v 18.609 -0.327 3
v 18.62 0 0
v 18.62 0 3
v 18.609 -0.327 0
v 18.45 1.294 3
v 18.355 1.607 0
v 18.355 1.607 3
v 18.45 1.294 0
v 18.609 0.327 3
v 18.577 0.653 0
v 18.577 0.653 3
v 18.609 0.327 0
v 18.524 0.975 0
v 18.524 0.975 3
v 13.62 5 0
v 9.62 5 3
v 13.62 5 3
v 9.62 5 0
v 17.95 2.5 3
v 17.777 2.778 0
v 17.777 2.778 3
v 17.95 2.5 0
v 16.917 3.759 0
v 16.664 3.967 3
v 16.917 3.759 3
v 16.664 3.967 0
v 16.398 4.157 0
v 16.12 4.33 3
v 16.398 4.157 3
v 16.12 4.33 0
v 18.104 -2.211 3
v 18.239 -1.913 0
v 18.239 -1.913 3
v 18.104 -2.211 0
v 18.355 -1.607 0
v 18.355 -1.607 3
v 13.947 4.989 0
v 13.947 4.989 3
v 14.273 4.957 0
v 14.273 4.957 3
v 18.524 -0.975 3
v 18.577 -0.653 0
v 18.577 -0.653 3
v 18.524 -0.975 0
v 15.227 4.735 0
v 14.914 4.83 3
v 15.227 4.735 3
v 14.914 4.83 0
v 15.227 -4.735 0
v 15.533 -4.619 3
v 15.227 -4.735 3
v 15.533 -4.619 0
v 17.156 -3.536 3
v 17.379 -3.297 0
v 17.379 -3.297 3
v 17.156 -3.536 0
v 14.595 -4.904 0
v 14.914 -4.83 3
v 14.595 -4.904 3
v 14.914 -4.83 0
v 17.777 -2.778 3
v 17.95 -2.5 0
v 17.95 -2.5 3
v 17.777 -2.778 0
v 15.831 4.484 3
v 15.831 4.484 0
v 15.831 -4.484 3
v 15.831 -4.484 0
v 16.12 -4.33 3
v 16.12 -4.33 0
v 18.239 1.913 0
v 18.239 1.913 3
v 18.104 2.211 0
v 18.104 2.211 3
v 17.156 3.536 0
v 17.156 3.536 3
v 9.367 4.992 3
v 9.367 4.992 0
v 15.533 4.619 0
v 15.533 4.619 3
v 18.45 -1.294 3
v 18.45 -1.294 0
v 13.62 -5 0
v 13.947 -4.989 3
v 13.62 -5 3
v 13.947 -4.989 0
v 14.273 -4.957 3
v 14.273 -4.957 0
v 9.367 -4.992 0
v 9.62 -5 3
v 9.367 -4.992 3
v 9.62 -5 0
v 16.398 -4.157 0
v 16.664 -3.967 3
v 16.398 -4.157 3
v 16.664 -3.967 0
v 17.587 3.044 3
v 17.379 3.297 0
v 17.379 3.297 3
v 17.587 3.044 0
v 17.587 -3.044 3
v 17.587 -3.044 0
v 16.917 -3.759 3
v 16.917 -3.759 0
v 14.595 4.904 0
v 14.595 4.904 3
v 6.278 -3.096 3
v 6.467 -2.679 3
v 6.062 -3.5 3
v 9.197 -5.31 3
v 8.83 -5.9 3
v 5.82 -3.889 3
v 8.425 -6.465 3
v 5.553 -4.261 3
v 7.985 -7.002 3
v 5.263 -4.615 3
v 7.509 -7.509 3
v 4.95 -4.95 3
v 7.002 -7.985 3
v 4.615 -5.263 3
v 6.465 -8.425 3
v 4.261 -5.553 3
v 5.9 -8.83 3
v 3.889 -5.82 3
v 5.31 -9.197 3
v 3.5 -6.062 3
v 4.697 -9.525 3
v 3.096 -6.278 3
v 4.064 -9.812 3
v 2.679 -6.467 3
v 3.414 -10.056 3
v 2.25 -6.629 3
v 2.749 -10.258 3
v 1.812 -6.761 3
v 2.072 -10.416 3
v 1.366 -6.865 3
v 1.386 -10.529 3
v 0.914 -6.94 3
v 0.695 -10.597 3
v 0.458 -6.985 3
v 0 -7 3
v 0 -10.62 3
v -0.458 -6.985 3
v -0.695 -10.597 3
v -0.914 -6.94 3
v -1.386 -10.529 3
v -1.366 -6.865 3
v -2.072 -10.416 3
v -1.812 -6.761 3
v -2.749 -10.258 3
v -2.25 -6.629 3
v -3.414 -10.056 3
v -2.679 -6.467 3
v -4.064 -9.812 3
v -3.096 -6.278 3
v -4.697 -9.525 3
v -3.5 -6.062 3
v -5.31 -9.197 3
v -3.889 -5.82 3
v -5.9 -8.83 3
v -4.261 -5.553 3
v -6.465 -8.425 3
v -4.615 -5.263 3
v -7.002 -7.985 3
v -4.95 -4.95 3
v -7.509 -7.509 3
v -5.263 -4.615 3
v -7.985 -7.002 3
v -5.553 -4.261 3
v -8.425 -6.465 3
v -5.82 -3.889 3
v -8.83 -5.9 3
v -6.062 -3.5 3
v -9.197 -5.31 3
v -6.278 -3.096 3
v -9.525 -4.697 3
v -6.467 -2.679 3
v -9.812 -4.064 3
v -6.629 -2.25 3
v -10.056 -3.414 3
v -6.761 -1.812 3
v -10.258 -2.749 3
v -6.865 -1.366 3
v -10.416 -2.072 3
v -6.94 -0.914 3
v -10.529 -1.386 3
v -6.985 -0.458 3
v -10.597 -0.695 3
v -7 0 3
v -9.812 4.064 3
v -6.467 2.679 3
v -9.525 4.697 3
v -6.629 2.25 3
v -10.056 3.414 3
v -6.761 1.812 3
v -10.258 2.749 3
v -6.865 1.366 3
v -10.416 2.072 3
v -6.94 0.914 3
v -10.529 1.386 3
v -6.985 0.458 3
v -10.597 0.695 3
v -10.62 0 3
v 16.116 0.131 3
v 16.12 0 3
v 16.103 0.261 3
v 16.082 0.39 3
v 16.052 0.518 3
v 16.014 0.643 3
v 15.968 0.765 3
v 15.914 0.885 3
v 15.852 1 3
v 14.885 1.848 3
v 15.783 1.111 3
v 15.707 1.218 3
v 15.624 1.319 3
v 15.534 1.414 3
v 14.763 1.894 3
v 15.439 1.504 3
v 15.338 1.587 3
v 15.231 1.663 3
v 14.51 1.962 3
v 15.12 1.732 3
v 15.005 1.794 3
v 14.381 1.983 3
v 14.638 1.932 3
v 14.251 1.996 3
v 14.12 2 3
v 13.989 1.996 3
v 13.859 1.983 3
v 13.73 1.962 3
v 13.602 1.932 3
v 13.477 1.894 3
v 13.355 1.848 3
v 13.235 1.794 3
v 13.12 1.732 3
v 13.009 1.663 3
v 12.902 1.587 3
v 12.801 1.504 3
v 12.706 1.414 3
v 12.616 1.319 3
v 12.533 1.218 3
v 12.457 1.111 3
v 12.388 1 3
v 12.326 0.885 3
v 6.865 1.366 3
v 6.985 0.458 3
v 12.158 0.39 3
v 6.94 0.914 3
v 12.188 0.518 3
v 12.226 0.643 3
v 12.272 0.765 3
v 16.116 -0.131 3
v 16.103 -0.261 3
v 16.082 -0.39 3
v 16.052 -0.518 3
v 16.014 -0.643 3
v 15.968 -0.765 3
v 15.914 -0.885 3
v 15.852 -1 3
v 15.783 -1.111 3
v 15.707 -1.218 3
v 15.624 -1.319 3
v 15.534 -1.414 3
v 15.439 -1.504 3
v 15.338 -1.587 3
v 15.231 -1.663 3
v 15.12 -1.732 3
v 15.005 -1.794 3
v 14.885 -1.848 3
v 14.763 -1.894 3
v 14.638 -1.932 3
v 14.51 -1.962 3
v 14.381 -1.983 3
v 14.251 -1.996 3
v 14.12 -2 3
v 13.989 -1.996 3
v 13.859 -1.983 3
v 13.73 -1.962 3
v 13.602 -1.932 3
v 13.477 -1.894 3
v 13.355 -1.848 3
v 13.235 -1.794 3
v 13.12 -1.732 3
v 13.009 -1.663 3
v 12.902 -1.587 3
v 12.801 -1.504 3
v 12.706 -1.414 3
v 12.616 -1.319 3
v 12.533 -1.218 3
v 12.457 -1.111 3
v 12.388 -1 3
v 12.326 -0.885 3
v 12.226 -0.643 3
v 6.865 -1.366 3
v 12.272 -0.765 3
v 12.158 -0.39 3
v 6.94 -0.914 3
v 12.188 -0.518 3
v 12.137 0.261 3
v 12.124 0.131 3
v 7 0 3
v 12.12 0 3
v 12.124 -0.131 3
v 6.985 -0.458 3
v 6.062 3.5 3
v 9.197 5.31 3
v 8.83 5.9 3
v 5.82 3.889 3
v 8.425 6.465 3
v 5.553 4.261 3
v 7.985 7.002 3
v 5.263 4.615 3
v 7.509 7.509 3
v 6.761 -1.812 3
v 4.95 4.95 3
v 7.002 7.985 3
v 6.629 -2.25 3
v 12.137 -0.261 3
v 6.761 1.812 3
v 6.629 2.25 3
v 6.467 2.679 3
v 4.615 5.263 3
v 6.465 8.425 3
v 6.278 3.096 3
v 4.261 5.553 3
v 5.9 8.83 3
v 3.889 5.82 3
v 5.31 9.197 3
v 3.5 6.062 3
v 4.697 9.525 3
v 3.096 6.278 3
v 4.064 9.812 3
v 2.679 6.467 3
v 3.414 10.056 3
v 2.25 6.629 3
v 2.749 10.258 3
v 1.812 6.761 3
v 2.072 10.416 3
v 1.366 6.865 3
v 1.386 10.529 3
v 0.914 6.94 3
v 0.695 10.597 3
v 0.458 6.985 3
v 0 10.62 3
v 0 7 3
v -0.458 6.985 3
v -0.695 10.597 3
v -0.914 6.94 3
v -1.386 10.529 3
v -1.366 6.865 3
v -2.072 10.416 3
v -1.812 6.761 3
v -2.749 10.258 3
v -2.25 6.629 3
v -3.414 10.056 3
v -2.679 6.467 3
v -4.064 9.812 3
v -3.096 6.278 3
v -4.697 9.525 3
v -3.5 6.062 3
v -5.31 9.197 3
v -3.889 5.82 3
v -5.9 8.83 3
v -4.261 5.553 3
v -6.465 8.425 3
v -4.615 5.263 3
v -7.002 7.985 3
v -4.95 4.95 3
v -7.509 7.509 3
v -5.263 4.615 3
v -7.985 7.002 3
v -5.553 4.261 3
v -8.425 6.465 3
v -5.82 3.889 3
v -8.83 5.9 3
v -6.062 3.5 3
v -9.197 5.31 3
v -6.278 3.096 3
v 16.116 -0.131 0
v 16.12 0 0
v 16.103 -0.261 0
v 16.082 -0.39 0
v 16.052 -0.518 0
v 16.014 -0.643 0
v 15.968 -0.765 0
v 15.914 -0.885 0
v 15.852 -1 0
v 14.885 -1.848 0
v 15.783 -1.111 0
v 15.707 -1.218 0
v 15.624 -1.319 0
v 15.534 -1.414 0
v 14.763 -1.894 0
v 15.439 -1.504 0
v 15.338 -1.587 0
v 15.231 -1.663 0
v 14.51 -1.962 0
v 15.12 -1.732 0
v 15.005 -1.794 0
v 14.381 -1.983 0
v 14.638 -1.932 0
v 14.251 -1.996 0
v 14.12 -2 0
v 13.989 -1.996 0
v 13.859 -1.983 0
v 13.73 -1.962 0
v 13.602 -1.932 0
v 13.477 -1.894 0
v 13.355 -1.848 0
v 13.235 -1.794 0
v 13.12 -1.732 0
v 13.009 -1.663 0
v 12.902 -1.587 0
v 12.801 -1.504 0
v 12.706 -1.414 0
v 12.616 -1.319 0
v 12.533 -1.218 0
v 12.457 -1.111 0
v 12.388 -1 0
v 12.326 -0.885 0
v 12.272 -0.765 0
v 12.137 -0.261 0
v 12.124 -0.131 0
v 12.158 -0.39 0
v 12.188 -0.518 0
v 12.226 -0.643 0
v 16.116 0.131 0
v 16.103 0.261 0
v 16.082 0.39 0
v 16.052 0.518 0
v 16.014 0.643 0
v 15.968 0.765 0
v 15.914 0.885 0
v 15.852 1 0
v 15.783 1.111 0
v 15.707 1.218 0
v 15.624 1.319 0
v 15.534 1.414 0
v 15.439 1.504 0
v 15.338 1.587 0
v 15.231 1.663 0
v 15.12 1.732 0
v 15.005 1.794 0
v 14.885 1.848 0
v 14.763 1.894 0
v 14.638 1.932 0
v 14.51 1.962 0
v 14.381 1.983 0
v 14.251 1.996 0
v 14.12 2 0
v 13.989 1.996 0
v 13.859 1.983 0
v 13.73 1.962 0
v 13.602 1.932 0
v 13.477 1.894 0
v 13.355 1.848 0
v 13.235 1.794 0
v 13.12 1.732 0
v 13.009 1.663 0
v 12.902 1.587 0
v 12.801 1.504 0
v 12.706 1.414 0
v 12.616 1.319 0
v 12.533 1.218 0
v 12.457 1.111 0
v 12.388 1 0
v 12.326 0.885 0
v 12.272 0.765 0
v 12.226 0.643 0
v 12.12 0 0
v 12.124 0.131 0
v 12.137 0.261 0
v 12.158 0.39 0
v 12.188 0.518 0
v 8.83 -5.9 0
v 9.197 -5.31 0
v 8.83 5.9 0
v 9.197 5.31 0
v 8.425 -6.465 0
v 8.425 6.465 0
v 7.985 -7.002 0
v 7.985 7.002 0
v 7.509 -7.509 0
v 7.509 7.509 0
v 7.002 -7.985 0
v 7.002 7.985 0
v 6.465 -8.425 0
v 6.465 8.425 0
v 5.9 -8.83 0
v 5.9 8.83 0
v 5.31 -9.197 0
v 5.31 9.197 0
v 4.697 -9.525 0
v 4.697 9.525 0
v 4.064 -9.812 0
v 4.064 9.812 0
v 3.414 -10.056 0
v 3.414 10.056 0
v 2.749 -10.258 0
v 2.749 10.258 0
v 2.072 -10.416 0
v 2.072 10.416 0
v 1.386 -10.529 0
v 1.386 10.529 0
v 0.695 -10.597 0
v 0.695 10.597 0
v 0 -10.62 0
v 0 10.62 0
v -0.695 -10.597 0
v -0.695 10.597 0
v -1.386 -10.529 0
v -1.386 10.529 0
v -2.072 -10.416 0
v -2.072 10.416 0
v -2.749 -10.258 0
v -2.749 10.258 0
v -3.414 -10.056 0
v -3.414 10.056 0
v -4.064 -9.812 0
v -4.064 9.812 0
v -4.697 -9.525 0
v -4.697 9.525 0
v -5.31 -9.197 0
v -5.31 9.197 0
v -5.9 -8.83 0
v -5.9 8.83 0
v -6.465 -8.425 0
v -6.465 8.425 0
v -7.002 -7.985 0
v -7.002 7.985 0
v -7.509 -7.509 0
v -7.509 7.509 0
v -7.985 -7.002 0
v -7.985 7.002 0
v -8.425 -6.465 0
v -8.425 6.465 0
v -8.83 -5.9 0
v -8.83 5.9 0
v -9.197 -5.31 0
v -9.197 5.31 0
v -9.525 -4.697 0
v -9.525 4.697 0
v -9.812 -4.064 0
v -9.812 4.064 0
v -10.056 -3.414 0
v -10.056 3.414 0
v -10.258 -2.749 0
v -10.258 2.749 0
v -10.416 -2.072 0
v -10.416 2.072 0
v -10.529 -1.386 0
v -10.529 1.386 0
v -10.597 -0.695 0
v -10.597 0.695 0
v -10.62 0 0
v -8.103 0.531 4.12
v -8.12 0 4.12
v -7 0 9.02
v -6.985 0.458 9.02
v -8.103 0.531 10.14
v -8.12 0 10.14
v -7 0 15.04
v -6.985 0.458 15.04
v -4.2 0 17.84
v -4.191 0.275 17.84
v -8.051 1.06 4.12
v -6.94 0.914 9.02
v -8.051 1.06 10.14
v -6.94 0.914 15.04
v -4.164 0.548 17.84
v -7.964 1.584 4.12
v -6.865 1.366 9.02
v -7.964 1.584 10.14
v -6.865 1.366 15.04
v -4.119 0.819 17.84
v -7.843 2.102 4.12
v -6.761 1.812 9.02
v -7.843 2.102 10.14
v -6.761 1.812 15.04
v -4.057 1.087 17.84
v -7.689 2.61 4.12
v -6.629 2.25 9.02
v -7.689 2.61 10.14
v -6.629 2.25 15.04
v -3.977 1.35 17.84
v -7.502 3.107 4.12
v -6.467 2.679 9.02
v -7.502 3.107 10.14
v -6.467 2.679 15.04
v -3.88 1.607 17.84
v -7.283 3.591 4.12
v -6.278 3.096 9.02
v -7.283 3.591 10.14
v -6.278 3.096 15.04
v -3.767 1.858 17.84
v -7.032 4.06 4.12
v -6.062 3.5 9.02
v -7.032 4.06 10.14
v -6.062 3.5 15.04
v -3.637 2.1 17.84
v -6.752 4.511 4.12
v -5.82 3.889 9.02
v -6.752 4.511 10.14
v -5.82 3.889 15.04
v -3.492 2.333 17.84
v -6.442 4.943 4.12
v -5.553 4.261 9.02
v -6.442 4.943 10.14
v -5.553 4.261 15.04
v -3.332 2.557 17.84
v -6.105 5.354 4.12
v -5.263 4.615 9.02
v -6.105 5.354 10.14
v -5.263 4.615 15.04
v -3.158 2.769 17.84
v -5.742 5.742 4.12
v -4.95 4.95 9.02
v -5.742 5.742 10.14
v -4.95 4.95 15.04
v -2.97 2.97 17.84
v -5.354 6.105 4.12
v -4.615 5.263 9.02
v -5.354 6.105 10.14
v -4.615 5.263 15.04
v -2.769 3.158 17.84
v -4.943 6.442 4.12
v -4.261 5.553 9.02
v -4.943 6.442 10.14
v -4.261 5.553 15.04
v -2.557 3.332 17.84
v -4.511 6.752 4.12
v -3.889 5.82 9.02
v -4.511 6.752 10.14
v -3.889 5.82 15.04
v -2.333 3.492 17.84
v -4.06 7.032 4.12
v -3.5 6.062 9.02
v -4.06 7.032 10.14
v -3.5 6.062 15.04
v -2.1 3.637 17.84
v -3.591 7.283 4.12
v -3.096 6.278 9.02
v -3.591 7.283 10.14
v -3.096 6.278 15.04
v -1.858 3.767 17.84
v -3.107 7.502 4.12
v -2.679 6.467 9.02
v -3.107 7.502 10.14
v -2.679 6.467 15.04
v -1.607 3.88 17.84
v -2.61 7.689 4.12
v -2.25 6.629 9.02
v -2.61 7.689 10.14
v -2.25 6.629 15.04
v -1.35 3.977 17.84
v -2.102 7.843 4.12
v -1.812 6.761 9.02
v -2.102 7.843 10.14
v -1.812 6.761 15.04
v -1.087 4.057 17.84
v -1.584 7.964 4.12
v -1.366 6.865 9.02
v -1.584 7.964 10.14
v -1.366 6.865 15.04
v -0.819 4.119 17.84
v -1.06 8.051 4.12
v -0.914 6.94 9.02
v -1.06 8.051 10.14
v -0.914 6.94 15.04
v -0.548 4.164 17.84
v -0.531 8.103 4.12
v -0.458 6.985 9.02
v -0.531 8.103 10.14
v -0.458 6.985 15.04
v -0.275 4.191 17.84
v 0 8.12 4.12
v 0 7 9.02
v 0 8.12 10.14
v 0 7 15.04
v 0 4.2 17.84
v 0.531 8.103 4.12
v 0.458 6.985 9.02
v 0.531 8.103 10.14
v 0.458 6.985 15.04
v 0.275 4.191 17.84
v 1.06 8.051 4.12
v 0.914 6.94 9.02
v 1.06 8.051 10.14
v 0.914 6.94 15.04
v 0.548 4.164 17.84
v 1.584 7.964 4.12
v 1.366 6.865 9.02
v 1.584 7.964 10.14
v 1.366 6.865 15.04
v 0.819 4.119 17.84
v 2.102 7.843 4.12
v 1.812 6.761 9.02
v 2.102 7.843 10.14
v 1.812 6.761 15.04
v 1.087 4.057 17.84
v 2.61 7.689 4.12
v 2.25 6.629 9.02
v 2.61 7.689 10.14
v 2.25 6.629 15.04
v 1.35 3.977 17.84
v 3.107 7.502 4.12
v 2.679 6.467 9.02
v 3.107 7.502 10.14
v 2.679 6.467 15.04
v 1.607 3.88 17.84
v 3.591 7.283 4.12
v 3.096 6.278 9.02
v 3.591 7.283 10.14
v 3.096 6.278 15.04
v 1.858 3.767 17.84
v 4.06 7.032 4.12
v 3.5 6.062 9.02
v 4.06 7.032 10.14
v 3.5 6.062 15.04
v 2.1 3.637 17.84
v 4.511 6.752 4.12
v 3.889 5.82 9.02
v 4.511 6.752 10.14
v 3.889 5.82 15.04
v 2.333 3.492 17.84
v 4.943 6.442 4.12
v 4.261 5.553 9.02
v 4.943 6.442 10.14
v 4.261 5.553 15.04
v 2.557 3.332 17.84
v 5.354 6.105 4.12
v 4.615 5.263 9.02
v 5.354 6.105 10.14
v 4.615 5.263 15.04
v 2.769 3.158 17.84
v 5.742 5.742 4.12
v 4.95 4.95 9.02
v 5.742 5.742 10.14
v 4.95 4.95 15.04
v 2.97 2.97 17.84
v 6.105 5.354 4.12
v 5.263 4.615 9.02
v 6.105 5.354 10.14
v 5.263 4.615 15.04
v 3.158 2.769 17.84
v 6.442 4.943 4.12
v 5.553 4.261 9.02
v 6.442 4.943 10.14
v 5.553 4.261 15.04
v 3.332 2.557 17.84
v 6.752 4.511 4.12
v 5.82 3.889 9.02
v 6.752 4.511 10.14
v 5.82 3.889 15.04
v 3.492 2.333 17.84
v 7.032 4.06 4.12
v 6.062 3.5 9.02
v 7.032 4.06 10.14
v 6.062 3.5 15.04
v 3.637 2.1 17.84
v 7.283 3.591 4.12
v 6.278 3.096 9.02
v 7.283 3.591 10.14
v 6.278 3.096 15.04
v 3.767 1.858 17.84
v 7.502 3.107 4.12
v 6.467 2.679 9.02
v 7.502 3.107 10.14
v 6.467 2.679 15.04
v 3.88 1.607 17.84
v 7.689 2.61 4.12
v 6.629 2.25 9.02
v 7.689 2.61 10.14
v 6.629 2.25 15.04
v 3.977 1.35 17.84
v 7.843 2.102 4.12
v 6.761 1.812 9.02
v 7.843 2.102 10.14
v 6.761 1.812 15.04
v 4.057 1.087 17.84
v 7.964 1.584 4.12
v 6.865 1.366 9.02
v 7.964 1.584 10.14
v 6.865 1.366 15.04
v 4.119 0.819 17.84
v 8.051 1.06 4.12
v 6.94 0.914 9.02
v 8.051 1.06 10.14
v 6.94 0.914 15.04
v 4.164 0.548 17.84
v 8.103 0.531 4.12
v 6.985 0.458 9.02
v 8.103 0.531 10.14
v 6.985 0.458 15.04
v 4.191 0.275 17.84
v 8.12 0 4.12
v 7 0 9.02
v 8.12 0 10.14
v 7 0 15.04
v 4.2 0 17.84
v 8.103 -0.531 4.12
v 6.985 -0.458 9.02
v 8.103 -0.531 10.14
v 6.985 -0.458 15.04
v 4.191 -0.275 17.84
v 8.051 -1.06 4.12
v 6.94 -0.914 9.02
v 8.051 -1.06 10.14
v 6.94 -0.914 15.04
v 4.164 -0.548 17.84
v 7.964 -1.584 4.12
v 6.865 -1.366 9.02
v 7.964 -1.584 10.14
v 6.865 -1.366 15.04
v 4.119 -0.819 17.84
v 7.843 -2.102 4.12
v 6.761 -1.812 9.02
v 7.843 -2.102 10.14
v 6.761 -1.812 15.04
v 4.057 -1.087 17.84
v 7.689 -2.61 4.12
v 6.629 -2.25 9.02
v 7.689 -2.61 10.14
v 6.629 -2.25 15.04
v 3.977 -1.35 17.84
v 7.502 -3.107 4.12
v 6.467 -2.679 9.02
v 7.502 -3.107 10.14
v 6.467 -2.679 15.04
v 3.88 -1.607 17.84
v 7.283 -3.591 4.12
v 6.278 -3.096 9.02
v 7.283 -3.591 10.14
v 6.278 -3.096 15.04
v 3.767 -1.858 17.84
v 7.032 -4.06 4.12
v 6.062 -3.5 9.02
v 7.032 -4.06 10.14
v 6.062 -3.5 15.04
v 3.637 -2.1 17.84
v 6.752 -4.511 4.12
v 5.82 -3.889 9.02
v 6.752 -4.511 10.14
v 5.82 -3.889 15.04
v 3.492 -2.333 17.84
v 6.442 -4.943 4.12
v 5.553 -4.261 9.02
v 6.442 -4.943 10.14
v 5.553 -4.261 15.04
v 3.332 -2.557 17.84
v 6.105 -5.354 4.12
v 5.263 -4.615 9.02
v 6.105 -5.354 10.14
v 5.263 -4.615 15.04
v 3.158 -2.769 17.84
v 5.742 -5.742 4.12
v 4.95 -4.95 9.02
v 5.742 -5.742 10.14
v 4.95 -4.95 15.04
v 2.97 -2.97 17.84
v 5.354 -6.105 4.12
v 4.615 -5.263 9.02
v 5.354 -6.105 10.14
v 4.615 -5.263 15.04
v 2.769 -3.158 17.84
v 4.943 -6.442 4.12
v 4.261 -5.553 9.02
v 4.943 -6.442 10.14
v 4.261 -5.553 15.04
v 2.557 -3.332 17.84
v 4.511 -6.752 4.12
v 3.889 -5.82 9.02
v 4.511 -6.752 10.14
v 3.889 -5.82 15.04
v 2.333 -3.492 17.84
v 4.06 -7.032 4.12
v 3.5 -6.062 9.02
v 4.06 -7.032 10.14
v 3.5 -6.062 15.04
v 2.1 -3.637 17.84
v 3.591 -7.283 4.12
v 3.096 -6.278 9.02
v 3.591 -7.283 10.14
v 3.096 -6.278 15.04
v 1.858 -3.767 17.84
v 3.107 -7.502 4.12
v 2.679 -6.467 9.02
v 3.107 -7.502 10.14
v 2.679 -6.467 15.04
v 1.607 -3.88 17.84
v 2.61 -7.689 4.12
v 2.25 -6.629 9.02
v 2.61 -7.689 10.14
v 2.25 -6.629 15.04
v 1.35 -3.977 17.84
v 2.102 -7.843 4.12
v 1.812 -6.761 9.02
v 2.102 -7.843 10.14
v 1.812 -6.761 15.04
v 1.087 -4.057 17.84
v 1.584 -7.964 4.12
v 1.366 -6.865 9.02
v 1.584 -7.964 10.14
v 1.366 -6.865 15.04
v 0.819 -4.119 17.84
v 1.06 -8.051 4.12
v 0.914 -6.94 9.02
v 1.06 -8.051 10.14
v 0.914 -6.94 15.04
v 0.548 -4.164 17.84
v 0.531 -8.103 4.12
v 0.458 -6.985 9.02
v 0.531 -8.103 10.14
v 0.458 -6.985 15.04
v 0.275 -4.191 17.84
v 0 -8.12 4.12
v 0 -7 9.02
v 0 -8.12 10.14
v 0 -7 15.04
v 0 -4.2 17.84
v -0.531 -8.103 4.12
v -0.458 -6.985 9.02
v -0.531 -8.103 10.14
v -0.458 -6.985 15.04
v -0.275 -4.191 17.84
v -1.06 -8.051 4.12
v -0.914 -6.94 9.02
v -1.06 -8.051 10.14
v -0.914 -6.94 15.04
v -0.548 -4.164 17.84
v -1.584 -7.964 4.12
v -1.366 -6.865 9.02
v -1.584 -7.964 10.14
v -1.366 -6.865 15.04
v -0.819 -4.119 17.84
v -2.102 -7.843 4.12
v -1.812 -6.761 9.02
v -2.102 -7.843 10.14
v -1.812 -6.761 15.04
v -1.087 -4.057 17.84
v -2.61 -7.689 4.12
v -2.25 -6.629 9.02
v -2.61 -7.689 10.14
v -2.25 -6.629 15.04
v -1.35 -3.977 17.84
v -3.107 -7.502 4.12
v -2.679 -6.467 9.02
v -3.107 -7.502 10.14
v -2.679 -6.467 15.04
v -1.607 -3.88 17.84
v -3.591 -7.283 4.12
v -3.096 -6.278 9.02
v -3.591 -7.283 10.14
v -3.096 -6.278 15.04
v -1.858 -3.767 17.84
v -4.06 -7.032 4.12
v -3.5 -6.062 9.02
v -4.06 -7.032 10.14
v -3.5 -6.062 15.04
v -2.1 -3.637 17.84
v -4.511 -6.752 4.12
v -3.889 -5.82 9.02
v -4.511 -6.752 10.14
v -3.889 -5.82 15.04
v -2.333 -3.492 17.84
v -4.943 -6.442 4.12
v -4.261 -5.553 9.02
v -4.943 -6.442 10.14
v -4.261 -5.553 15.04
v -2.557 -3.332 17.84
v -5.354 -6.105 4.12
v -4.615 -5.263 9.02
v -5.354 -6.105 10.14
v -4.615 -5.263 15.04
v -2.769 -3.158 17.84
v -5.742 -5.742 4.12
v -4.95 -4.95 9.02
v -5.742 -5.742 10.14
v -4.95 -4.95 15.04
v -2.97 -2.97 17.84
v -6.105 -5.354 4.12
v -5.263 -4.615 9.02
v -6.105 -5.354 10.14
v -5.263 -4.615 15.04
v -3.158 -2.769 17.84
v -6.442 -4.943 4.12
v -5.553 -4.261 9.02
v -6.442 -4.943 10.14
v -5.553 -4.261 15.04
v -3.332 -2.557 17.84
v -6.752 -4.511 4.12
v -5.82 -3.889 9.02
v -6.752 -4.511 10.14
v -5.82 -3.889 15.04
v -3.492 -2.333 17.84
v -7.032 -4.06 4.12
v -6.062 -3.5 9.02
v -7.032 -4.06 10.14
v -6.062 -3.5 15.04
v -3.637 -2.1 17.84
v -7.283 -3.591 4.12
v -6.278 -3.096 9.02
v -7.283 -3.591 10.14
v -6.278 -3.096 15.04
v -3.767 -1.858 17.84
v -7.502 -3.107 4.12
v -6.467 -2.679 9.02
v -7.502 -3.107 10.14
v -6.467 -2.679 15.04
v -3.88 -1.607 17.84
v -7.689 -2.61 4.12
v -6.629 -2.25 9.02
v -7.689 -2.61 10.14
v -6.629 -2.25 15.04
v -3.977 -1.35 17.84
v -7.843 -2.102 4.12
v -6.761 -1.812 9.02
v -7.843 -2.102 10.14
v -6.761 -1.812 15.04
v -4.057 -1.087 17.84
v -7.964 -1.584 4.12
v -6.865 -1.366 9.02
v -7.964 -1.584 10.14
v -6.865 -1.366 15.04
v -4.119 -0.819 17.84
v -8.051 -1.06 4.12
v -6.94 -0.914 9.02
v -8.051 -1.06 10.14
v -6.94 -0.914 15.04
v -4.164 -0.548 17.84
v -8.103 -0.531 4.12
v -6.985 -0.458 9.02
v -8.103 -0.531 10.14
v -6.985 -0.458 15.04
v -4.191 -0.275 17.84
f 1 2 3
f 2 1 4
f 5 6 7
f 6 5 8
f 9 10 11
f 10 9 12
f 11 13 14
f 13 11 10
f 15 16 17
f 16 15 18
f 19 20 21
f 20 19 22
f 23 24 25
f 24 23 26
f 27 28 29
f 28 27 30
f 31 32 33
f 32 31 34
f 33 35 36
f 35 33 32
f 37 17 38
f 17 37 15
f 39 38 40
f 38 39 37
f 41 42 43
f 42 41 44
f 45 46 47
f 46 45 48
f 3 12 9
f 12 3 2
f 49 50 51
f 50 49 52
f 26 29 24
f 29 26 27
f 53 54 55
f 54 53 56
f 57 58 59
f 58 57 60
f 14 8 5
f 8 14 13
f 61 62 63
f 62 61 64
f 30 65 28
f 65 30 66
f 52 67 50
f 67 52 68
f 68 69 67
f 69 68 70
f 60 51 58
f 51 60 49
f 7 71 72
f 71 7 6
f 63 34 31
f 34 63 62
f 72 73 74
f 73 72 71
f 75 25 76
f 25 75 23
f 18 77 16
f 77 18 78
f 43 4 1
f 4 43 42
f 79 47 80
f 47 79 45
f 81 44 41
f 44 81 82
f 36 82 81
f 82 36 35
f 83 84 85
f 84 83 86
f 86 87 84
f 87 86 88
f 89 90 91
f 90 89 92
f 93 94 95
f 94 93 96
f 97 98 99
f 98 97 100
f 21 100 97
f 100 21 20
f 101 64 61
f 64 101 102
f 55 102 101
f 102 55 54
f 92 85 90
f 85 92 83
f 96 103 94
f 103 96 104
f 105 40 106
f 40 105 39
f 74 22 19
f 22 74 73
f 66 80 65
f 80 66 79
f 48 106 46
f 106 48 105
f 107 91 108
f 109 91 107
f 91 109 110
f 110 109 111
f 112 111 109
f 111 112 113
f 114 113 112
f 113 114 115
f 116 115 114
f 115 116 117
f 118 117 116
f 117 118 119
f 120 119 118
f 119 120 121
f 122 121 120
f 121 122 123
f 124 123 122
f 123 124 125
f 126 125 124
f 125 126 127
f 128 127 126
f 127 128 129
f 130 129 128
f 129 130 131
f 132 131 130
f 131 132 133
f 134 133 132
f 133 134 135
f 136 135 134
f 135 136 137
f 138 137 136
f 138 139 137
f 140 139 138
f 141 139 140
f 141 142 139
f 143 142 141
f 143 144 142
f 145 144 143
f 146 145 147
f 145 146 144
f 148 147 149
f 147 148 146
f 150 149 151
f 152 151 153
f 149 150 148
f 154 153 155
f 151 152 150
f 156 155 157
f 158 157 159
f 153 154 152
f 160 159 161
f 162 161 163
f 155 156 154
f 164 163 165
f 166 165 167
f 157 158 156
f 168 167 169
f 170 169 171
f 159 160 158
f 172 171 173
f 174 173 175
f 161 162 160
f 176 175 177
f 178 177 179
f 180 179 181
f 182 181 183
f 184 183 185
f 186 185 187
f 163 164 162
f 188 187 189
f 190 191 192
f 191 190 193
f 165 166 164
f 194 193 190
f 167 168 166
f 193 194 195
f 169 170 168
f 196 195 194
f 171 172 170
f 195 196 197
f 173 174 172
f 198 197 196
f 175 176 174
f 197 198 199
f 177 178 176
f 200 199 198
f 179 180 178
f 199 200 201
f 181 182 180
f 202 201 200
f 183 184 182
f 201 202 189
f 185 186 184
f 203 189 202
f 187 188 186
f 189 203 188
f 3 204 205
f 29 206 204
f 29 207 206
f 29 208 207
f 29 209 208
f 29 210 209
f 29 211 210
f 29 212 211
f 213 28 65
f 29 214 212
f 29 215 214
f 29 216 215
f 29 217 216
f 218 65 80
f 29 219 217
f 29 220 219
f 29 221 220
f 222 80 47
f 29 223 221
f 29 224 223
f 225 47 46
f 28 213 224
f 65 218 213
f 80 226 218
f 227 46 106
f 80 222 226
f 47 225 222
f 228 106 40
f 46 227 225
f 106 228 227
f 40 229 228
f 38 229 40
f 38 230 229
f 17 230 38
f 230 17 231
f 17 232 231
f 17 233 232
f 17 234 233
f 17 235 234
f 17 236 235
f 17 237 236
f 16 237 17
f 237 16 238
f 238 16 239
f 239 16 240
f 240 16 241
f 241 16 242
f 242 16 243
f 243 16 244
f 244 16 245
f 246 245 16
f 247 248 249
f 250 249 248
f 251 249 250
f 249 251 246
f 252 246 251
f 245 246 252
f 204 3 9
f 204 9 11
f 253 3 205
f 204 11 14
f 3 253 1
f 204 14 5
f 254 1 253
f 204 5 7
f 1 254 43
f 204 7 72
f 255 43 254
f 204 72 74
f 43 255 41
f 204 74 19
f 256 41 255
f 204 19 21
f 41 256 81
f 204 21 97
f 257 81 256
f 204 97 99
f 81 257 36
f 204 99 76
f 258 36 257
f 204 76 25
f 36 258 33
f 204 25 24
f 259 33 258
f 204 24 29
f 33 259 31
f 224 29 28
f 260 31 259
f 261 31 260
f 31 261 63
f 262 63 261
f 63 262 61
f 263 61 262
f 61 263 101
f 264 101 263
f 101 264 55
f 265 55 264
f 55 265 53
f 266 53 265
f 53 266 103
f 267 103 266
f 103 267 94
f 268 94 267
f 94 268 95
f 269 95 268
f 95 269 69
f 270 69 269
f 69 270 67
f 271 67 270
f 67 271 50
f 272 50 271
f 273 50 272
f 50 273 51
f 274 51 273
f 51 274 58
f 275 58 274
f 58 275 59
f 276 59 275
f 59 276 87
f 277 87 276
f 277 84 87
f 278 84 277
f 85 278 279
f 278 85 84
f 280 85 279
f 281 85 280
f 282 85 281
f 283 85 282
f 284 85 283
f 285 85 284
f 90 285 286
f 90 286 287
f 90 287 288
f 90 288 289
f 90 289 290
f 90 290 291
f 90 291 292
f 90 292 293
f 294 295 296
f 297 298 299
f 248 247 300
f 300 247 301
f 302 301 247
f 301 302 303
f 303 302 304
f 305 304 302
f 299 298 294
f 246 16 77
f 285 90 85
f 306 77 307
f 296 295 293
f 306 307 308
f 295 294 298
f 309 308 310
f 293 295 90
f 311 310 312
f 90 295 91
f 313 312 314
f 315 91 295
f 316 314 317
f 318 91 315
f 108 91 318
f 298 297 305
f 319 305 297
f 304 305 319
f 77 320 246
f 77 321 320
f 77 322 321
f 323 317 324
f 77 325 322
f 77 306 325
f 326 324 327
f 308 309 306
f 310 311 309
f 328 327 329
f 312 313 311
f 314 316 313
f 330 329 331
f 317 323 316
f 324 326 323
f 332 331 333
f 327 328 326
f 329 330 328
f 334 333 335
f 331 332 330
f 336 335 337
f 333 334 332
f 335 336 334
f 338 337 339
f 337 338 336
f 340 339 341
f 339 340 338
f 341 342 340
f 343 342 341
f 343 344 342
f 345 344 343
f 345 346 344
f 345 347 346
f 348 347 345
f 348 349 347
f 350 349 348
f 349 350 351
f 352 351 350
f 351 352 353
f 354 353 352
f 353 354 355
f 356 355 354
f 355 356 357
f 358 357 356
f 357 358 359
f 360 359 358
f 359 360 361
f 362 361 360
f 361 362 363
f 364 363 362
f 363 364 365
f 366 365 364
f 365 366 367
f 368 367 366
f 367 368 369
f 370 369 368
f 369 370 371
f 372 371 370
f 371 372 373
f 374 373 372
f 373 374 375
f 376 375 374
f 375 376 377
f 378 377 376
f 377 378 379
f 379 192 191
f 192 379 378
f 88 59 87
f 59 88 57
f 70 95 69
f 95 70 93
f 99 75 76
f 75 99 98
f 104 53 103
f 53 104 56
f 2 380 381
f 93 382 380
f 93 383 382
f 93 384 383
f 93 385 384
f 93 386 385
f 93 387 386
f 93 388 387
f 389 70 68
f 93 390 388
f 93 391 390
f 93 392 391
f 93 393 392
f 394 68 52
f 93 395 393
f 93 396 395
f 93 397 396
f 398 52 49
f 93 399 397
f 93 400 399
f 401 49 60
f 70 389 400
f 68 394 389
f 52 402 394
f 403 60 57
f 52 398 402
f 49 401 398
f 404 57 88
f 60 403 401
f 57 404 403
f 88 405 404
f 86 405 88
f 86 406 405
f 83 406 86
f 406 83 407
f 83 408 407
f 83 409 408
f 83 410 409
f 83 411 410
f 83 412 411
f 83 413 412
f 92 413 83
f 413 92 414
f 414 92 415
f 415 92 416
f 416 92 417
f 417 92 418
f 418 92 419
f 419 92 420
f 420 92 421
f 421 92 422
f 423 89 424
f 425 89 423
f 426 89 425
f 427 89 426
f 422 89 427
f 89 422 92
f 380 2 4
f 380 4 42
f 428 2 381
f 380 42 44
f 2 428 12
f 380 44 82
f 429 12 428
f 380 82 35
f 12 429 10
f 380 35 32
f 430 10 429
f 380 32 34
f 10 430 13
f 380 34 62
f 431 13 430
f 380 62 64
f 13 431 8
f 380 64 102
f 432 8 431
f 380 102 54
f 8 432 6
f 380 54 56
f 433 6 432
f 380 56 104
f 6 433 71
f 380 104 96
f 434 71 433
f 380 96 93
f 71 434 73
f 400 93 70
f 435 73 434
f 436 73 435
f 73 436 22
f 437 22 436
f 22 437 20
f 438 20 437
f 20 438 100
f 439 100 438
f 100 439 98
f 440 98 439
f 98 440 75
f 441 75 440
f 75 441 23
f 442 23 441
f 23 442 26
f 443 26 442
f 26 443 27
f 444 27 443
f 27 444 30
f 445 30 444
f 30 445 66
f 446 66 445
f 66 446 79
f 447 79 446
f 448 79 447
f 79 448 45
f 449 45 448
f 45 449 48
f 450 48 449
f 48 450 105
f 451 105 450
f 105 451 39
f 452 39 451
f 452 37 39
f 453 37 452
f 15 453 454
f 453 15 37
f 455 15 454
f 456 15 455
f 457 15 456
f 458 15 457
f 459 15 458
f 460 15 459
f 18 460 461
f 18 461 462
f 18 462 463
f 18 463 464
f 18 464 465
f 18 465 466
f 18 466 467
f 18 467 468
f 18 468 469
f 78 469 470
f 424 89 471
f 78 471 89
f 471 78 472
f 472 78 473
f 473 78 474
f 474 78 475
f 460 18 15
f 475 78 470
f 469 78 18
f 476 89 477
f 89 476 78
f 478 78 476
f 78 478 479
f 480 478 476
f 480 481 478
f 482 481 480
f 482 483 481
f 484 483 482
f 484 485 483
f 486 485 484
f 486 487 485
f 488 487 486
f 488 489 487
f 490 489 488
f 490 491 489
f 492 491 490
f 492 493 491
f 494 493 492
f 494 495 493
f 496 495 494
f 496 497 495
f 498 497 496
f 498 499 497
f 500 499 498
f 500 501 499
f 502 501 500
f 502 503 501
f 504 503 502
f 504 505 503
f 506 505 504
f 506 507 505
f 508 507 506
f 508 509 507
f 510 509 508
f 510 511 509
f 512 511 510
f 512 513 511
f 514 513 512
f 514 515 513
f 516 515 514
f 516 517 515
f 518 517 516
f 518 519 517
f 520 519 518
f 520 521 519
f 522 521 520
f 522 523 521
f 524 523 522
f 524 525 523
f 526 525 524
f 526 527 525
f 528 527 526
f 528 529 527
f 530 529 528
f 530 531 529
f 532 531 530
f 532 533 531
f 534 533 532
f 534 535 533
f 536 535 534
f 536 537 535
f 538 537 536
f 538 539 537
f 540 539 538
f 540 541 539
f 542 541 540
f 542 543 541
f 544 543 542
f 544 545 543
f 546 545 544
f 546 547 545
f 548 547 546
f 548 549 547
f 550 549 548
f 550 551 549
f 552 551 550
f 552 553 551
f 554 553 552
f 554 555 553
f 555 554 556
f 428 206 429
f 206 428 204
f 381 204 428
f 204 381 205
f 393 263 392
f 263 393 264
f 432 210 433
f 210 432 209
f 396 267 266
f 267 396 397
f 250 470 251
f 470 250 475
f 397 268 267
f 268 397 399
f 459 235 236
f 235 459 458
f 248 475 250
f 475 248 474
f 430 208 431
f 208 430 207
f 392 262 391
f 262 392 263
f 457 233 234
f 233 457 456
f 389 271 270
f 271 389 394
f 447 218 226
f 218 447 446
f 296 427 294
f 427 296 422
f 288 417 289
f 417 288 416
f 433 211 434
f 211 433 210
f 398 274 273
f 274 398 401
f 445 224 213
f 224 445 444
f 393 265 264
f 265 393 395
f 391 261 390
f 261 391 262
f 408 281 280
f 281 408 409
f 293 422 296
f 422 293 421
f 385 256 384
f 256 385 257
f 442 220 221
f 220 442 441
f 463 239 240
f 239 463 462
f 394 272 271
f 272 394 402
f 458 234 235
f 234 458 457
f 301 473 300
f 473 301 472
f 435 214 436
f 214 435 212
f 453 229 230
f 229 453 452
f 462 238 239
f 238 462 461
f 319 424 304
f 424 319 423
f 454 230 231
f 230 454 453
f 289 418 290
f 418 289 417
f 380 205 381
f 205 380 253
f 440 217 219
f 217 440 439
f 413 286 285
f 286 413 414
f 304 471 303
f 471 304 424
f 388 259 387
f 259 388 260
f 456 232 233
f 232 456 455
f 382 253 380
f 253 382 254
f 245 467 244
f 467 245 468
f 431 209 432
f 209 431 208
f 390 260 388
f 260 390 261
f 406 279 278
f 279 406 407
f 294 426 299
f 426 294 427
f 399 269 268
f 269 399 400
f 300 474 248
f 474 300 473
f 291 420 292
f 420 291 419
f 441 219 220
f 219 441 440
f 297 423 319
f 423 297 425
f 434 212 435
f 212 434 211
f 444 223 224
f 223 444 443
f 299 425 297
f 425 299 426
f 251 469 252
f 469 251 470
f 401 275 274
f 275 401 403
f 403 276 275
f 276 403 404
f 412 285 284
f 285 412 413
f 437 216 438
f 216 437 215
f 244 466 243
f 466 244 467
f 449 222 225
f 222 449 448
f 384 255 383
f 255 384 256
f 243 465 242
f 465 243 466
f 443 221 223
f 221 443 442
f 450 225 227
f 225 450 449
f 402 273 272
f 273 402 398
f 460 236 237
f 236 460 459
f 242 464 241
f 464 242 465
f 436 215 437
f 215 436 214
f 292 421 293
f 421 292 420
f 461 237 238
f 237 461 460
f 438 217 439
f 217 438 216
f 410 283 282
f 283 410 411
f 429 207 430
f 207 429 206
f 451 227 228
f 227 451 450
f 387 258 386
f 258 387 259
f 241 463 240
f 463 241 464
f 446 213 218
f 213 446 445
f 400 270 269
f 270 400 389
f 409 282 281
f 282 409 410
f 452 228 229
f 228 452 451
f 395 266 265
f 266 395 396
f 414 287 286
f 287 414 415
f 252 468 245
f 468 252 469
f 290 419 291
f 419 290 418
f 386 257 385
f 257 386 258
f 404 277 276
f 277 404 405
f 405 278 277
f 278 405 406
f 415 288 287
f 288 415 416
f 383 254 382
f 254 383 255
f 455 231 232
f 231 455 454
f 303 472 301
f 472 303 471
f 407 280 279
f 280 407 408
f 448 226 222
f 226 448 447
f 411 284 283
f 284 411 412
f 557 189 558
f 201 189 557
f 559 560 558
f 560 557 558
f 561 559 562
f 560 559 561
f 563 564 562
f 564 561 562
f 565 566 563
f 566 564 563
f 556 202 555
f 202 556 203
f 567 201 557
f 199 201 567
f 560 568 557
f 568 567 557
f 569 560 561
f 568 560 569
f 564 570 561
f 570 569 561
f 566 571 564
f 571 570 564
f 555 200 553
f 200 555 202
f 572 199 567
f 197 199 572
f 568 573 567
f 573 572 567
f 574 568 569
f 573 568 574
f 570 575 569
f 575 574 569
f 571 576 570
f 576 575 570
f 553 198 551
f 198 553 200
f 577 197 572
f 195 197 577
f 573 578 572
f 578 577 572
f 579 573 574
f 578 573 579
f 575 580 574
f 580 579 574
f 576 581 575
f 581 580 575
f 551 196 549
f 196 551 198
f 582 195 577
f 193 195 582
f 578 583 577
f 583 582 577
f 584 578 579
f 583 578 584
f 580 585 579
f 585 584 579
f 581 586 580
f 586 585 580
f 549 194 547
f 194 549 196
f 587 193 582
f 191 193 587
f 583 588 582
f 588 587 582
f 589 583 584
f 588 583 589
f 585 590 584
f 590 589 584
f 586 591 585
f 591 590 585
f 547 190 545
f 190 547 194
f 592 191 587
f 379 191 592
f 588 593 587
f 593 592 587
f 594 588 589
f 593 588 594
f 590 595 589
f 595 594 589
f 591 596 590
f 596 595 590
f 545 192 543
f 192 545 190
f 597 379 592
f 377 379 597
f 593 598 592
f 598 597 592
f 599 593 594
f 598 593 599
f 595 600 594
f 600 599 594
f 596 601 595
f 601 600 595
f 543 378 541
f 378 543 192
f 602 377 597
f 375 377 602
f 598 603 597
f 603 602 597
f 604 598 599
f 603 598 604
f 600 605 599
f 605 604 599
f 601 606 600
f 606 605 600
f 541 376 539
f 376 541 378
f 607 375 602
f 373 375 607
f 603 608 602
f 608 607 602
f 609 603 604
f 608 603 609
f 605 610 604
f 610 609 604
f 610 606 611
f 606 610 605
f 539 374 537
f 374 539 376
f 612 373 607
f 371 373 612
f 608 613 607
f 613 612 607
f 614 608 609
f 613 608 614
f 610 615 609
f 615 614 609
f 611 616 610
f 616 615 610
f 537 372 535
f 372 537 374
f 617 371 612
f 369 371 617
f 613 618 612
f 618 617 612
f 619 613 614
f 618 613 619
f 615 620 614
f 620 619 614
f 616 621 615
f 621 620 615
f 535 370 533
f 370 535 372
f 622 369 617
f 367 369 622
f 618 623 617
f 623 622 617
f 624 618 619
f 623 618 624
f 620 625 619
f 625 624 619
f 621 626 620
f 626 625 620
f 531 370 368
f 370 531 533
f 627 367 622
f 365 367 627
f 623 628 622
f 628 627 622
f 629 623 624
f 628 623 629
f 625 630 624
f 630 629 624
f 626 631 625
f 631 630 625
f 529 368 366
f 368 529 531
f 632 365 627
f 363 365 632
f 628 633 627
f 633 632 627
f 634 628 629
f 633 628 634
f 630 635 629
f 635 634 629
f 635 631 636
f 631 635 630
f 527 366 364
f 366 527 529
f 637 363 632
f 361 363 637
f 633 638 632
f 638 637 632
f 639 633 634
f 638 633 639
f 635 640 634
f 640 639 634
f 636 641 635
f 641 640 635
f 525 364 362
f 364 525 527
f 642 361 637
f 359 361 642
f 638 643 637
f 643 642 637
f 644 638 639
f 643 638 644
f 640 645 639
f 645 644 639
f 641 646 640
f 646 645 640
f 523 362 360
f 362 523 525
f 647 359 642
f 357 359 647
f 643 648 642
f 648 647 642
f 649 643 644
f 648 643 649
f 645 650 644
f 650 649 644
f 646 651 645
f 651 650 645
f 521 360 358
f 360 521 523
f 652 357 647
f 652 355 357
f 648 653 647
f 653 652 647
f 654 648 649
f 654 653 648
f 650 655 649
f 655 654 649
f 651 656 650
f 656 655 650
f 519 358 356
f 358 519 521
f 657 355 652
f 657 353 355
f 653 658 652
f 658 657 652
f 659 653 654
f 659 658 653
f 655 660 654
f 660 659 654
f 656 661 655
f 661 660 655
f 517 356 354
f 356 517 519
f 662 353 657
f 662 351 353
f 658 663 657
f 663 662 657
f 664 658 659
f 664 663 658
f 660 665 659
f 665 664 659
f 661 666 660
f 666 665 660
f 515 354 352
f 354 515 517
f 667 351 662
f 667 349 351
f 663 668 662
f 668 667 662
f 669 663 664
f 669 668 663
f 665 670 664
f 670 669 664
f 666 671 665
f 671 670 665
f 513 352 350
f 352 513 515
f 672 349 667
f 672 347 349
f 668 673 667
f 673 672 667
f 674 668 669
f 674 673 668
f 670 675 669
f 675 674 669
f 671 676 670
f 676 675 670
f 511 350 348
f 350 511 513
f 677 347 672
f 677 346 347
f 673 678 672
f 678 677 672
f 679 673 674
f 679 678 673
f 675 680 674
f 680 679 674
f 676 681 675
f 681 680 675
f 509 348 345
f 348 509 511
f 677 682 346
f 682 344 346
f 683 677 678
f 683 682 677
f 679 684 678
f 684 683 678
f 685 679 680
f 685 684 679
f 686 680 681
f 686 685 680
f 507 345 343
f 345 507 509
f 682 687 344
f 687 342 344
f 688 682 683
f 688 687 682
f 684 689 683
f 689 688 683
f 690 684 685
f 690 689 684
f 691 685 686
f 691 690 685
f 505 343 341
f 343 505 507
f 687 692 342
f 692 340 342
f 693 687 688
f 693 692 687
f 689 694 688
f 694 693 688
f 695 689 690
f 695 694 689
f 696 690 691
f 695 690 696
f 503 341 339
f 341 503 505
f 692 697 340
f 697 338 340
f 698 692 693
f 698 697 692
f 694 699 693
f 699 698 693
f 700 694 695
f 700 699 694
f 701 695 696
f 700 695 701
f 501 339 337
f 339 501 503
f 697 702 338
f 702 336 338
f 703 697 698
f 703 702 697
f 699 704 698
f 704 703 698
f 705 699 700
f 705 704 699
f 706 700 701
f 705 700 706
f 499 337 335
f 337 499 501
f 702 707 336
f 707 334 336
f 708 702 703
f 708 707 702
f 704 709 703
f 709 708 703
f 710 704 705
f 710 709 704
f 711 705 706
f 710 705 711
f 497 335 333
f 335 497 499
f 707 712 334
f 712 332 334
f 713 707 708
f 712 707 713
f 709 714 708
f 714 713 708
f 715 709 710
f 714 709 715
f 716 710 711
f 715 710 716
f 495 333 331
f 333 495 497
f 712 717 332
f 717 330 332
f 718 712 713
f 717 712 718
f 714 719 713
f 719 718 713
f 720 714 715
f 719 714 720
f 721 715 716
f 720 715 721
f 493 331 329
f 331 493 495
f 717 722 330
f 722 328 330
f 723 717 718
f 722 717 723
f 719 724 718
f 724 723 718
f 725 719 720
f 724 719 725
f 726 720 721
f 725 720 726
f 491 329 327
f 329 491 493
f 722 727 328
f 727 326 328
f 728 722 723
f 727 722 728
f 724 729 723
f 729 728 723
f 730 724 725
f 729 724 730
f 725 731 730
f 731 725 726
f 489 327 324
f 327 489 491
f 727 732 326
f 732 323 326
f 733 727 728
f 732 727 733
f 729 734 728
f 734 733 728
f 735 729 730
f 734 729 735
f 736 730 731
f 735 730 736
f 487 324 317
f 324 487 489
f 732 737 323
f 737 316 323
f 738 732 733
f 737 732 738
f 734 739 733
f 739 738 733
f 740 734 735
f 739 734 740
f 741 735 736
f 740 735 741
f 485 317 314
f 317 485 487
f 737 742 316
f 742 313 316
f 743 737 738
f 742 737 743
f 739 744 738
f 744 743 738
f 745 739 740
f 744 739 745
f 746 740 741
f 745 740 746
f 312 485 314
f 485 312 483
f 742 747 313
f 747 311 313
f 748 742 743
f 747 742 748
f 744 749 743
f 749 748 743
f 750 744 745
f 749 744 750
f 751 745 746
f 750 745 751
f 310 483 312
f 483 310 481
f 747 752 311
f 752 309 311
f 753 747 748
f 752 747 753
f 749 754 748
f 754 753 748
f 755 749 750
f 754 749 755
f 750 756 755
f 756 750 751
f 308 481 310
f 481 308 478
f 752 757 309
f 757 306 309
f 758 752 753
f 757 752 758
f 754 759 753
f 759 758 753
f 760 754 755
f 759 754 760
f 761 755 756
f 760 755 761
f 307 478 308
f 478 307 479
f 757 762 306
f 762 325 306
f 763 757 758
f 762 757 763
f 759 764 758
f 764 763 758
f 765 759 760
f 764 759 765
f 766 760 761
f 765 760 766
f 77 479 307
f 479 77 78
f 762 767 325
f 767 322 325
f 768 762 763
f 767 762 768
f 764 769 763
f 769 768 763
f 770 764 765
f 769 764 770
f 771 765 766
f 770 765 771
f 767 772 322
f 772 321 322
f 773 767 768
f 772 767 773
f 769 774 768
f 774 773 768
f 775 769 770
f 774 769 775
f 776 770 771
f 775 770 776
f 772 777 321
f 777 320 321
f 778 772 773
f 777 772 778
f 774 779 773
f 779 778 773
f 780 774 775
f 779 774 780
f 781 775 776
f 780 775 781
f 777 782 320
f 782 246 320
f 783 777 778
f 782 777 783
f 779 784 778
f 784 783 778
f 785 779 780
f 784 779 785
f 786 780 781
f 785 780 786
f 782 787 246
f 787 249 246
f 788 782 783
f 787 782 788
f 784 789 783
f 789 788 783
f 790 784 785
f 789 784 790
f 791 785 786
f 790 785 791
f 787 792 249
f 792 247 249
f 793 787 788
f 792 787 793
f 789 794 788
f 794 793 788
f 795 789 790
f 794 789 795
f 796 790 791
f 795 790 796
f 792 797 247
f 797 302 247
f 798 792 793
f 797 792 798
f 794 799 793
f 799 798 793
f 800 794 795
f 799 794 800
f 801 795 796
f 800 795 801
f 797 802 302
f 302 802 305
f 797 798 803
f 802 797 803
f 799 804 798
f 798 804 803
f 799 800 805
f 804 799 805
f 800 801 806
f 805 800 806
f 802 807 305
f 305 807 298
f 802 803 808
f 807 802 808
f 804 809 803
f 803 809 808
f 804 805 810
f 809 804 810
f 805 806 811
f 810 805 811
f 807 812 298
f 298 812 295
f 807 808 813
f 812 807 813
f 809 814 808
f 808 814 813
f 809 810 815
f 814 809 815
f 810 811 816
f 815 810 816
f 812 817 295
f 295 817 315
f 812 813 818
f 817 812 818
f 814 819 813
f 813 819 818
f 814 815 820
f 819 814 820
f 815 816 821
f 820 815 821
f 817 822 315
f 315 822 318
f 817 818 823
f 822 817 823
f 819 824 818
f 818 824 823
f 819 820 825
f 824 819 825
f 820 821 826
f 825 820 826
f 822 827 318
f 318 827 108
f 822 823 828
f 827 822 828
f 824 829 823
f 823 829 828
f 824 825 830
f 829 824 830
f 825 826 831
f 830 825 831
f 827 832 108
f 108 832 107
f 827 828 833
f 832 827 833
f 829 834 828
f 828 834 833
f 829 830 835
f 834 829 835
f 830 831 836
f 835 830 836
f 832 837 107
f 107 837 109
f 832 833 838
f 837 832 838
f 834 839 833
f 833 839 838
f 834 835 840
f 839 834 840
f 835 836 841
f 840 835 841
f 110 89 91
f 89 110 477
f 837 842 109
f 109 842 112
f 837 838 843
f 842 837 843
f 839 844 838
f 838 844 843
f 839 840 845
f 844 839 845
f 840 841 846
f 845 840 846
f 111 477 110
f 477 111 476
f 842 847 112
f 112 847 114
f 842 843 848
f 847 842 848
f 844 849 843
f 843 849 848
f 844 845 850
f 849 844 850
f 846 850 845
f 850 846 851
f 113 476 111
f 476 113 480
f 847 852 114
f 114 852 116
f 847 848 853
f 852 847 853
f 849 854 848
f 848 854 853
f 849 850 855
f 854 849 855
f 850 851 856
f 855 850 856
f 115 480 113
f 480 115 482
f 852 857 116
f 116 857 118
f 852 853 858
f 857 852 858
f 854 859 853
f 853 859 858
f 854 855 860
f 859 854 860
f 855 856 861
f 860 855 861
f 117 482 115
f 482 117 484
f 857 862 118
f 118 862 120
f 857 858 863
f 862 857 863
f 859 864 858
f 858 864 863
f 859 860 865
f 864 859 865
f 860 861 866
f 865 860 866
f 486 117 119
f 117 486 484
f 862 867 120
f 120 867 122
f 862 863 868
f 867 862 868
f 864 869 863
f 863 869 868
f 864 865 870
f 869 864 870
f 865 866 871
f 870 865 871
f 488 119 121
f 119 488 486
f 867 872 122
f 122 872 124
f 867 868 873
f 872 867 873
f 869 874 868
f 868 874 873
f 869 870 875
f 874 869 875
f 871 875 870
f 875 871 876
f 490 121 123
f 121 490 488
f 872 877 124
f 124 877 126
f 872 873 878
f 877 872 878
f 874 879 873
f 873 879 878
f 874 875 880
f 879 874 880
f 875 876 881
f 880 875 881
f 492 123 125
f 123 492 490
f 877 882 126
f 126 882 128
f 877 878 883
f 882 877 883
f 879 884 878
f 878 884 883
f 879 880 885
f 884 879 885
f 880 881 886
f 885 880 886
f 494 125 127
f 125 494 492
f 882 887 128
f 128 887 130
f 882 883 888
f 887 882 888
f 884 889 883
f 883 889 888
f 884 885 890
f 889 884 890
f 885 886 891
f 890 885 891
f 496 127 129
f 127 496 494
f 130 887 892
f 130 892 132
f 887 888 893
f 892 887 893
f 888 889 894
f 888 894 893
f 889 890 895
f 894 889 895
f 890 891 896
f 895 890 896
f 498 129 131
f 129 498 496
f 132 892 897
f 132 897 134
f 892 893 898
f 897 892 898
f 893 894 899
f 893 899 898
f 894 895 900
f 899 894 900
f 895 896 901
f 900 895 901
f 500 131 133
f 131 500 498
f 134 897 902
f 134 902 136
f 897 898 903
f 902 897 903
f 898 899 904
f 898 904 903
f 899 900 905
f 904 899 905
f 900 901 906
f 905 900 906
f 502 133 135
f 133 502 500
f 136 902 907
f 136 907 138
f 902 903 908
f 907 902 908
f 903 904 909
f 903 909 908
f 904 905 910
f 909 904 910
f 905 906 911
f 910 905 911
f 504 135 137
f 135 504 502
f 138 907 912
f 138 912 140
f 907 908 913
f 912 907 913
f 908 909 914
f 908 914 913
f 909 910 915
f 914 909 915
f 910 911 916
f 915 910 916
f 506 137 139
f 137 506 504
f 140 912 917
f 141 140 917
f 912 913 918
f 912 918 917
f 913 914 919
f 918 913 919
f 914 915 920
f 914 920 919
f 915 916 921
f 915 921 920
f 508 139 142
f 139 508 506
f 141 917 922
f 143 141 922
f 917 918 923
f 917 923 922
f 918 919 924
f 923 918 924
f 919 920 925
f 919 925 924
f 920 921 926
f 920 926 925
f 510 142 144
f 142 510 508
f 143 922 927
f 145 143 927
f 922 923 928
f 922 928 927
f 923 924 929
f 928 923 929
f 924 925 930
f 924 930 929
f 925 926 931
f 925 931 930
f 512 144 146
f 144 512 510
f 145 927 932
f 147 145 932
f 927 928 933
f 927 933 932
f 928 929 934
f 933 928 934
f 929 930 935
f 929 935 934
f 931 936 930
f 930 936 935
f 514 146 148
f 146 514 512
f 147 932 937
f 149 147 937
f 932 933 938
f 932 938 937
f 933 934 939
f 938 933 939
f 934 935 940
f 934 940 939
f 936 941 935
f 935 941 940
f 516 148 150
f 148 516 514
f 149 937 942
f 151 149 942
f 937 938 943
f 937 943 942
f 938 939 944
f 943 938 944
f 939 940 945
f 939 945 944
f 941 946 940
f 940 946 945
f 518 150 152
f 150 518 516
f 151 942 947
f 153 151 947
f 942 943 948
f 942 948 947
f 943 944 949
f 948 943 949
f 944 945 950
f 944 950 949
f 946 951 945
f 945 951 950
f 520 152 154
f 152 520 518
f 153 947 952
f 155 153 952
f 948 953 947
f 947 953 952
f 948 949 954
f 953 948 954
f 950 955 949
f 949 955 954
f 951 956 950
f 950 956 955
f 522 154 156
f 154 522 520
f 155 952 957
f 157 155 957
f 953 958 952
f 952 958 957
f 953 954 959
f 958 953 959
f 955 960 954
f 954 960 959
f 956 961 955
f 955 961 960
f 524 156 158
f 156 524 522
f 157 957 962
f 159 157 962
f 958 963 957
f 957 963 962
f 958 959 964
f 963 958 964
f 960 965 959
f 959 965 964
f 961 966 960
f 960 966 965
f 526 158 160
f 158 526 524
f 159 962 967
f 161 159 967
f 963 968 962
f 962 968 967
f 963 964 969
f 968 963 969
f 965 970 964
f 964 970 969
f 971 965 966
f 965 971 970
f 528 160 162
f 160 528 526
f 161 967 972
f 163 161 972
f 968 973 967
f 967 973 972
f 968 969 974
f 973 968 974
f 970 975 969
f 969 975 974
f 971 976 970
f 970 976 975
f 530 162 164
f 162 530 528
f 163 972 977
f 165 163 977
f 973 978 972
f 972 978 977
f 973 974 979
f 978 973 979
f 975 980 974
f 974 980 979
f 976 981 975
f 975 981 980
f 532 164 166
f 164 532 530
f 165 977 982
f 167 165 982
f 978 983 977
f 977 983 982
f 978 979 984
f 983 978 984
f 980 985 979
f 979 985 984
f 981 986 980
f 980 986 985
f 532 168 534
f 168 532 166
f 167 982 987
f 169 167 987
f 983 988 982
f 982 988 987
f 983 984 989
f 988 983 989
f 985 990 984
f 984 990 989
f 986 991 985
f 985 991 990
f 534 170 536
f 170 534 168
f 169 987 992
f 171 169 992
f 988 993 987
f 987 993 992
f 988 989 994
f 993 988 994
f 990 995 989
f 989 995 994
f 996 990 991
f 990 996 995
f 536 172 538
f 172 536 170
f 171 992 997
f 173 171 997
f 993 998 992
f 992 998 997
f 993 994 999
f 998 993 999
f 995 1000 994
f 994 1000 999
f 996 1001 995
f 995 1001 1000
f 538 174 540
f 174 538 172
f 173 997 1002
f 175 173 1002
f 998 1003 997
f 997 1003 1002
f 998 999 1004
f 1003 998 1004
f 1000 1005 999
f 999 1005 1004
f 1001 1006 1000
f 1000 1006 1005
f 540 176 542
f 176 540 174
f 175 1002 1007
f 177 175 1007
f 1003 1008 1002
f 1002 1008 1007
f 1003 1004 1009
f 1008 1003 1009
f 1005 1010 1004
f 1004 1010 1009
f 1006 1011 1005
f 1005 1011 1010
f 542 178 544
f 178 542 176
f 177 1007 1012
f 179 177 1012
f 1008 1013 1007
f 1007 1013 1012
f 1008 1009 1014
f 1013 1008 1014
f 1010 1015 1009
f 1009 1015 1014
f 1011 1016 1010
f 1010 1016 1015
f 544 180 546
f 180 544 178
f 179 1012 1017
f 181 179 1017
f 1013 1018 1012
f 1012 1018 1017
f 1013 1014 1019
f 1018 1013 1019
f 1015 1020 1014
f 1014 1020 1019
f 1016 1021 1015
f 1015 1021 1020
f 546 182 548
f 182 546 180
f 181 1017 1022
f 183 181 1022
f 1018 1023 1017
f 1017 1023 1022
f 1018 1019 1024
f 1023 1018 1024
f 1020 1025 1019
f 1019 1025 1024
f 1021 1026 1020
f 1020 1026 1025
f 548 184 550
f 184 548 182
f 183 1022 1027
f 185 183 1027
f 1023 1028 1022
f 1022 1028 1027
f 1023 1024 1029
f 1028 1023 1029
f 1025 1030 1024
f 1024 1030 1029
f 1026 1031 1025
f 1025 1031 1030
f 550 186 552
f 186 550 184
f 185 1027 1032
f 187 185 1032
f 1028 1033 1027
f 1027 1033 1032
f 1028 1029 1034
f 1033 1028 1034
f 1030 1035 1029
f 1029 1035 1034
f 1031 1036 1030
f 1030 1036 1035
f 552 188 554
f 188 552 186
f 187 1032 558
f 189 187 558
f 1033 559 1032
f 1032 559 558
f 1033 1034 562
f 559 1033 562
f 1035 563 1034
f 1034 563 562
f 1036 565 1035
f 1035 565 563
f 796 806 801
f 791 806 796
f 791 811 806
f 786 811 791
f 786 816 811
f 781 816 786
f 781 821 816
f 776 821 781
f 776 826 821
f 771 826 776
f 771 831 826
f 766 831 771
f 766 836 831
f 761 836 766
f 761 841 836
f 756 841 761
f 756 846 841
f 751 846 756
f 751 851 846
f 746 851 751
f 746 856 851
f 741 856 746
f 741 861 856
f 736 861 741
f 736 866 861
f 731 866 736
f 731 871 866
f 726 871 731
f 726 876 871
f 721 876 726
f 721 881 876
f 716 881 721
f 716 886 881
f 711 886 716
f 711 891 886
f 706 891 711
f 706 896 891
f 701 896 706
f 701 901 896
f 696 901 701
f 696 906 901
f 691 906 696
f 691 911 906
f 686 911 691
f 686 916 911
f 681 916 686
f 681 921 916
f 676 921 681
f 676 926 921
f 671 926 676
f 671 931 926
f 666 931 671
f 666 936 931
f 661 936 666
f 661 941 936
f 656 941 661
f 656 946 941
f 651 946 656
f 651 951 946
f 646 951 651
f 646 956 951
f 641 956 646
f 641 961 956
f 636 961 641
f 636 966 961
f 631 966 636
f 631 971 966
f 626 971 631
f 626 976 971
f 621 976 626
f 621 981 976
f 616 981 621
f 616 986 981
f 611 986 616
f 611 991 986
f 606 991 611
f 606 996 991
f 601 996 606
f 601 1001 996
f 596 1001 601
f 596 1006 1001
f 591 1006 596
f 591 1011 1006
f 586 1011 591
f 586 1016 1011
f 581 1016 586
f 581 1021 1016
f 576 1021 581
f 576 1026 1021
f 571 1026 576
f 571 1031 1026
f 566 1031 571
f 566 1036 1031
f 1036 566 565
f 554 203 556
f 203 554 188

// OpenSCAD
// Hose / drip line end plug
// Hope Arising EPICS team (ASU) - original design. License: CC BY 4.0 (commercial use allowed).
// Pushes into the end of a drip irrigation line or garden hose to close it.
// The loop lets you hang it on a nail or tie it so it is not lost.
// Prints cap down, no supports. Use PETG (better with water and sun).

/* [Size] */
// Inside diameter of the hose or drip line
hose_inner_diameter = 14;  // [3:0.5:30]
// Number of barbs. More barbs hold tighter.
barb_count = 2;            // [1:1:4]

/* [Options] */
// Add a loop to hang or tie the plug
add_loop = 1;              // [0:No, 1:Yes]

/* [Hidden] */
$fn = 96;

module hose_end_plug() {
    r  = hose_inner_diameter / 2;
    h  = max(0.6, 0.08 * hose_inner_diameter);
    l  = max(3, 0.35 * hose_inner_diameter);
    cap_r = r + h + 2.5;
    cap_t = 3;
    n = barb_count;
    // solid barbed stem standing on the cap
    profile = concat(
        [[0, 0], [cap_r, 0], [cap_r, cap_t], [r, cap_t]],
        [for (i = [0 : n - 1]) each [[r + h, cap_t + i * (h + l) + h], [r, cap_t + (i + 1) * (h + l)]]],
        [[r * 0.6, cap_t + n * (h + l) + r * 0.4], [0, cap_t + n * (h + l) + r * 0.4]]
    );
    rotate_extrude() polygon(profile);
    if (add_loop == 1)
        translate([cap_r + 3, 0, 0])
            difference() {
                hull() {
                    cylinder(h = cap_t, r = 5);
                    translate([-4, 0, 0]) cylinder(h = cap_t, r = 5);
                }
                translate([0.5, 0, -1]) cylinder(h = cap_t + 2, r = 2);
            }
}

hose_end_plug();
